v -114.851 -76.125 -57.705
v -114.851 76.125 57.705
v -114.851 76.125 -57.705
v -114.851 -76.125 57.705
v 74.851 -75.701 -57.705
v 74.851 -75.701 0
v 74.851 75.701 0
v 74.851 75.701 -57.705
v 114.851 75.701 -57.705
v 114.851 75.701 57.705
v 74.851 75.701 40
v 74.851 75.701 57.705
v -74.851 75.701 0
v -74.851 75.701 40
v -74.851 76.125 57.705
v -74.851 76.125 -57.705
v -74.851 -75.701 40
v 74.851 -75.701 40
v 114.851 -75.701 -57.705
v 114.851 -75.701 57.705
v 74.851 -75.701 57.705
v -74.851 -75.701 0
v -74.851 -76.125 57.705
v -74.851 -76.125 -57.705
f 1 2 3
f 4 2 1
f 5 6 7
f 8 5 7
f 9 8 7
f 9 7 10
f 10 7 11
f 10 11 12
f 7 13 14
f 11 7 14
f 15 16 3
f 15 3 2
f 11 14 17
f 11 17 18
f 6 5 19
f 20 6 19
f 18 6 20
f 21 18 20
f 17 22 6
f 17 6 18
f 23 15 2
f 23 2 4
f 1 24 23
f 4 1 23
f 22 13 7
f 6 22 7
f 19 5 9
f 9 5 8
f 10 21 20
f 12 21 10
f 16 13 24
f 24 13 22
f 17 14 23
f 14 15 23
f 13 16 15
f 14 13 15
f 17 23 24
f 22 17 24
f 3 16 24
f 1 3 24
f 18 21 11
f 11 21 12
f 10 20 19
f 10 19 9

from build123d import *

# Parameters (mm, degrees)
F0_W     = 149.702176
F0_H     = 151.402846
F1_DEPTH = 40
F2_W     = 151.402846
F2_H     = 115.410104
F3_DEPTH = 40
F4_W     = 152.249246
F4_H     = 115.410104
F5_DEPTH = 40


with BuildPart() as f1:
    # F0 (on Top) → F1 (new body)
    with BuildSketch(Plane.XY):
        Rectangle(F0_W, F0_H)
    extrude(amount=F1_DEPTH)

    # F2 (on face) → F3 (join)
    with BuildSketch(Plane.YZ.offset(74.851088)):
        Rectangle(F2_W, F2_H)
    extrude(amount=F3_DEPTH)

    # F4 (on face) → F5 (join)
    with BuildSketch(Plane(origin=(-74.851088, 0, 0), x_dir=(0, -1, 0), z_dir=(-1, 0, 0))):
        Rectangle(F4_W, F4_H)
    extrude(amount=F5_DEPTH)


solid = f1.part
